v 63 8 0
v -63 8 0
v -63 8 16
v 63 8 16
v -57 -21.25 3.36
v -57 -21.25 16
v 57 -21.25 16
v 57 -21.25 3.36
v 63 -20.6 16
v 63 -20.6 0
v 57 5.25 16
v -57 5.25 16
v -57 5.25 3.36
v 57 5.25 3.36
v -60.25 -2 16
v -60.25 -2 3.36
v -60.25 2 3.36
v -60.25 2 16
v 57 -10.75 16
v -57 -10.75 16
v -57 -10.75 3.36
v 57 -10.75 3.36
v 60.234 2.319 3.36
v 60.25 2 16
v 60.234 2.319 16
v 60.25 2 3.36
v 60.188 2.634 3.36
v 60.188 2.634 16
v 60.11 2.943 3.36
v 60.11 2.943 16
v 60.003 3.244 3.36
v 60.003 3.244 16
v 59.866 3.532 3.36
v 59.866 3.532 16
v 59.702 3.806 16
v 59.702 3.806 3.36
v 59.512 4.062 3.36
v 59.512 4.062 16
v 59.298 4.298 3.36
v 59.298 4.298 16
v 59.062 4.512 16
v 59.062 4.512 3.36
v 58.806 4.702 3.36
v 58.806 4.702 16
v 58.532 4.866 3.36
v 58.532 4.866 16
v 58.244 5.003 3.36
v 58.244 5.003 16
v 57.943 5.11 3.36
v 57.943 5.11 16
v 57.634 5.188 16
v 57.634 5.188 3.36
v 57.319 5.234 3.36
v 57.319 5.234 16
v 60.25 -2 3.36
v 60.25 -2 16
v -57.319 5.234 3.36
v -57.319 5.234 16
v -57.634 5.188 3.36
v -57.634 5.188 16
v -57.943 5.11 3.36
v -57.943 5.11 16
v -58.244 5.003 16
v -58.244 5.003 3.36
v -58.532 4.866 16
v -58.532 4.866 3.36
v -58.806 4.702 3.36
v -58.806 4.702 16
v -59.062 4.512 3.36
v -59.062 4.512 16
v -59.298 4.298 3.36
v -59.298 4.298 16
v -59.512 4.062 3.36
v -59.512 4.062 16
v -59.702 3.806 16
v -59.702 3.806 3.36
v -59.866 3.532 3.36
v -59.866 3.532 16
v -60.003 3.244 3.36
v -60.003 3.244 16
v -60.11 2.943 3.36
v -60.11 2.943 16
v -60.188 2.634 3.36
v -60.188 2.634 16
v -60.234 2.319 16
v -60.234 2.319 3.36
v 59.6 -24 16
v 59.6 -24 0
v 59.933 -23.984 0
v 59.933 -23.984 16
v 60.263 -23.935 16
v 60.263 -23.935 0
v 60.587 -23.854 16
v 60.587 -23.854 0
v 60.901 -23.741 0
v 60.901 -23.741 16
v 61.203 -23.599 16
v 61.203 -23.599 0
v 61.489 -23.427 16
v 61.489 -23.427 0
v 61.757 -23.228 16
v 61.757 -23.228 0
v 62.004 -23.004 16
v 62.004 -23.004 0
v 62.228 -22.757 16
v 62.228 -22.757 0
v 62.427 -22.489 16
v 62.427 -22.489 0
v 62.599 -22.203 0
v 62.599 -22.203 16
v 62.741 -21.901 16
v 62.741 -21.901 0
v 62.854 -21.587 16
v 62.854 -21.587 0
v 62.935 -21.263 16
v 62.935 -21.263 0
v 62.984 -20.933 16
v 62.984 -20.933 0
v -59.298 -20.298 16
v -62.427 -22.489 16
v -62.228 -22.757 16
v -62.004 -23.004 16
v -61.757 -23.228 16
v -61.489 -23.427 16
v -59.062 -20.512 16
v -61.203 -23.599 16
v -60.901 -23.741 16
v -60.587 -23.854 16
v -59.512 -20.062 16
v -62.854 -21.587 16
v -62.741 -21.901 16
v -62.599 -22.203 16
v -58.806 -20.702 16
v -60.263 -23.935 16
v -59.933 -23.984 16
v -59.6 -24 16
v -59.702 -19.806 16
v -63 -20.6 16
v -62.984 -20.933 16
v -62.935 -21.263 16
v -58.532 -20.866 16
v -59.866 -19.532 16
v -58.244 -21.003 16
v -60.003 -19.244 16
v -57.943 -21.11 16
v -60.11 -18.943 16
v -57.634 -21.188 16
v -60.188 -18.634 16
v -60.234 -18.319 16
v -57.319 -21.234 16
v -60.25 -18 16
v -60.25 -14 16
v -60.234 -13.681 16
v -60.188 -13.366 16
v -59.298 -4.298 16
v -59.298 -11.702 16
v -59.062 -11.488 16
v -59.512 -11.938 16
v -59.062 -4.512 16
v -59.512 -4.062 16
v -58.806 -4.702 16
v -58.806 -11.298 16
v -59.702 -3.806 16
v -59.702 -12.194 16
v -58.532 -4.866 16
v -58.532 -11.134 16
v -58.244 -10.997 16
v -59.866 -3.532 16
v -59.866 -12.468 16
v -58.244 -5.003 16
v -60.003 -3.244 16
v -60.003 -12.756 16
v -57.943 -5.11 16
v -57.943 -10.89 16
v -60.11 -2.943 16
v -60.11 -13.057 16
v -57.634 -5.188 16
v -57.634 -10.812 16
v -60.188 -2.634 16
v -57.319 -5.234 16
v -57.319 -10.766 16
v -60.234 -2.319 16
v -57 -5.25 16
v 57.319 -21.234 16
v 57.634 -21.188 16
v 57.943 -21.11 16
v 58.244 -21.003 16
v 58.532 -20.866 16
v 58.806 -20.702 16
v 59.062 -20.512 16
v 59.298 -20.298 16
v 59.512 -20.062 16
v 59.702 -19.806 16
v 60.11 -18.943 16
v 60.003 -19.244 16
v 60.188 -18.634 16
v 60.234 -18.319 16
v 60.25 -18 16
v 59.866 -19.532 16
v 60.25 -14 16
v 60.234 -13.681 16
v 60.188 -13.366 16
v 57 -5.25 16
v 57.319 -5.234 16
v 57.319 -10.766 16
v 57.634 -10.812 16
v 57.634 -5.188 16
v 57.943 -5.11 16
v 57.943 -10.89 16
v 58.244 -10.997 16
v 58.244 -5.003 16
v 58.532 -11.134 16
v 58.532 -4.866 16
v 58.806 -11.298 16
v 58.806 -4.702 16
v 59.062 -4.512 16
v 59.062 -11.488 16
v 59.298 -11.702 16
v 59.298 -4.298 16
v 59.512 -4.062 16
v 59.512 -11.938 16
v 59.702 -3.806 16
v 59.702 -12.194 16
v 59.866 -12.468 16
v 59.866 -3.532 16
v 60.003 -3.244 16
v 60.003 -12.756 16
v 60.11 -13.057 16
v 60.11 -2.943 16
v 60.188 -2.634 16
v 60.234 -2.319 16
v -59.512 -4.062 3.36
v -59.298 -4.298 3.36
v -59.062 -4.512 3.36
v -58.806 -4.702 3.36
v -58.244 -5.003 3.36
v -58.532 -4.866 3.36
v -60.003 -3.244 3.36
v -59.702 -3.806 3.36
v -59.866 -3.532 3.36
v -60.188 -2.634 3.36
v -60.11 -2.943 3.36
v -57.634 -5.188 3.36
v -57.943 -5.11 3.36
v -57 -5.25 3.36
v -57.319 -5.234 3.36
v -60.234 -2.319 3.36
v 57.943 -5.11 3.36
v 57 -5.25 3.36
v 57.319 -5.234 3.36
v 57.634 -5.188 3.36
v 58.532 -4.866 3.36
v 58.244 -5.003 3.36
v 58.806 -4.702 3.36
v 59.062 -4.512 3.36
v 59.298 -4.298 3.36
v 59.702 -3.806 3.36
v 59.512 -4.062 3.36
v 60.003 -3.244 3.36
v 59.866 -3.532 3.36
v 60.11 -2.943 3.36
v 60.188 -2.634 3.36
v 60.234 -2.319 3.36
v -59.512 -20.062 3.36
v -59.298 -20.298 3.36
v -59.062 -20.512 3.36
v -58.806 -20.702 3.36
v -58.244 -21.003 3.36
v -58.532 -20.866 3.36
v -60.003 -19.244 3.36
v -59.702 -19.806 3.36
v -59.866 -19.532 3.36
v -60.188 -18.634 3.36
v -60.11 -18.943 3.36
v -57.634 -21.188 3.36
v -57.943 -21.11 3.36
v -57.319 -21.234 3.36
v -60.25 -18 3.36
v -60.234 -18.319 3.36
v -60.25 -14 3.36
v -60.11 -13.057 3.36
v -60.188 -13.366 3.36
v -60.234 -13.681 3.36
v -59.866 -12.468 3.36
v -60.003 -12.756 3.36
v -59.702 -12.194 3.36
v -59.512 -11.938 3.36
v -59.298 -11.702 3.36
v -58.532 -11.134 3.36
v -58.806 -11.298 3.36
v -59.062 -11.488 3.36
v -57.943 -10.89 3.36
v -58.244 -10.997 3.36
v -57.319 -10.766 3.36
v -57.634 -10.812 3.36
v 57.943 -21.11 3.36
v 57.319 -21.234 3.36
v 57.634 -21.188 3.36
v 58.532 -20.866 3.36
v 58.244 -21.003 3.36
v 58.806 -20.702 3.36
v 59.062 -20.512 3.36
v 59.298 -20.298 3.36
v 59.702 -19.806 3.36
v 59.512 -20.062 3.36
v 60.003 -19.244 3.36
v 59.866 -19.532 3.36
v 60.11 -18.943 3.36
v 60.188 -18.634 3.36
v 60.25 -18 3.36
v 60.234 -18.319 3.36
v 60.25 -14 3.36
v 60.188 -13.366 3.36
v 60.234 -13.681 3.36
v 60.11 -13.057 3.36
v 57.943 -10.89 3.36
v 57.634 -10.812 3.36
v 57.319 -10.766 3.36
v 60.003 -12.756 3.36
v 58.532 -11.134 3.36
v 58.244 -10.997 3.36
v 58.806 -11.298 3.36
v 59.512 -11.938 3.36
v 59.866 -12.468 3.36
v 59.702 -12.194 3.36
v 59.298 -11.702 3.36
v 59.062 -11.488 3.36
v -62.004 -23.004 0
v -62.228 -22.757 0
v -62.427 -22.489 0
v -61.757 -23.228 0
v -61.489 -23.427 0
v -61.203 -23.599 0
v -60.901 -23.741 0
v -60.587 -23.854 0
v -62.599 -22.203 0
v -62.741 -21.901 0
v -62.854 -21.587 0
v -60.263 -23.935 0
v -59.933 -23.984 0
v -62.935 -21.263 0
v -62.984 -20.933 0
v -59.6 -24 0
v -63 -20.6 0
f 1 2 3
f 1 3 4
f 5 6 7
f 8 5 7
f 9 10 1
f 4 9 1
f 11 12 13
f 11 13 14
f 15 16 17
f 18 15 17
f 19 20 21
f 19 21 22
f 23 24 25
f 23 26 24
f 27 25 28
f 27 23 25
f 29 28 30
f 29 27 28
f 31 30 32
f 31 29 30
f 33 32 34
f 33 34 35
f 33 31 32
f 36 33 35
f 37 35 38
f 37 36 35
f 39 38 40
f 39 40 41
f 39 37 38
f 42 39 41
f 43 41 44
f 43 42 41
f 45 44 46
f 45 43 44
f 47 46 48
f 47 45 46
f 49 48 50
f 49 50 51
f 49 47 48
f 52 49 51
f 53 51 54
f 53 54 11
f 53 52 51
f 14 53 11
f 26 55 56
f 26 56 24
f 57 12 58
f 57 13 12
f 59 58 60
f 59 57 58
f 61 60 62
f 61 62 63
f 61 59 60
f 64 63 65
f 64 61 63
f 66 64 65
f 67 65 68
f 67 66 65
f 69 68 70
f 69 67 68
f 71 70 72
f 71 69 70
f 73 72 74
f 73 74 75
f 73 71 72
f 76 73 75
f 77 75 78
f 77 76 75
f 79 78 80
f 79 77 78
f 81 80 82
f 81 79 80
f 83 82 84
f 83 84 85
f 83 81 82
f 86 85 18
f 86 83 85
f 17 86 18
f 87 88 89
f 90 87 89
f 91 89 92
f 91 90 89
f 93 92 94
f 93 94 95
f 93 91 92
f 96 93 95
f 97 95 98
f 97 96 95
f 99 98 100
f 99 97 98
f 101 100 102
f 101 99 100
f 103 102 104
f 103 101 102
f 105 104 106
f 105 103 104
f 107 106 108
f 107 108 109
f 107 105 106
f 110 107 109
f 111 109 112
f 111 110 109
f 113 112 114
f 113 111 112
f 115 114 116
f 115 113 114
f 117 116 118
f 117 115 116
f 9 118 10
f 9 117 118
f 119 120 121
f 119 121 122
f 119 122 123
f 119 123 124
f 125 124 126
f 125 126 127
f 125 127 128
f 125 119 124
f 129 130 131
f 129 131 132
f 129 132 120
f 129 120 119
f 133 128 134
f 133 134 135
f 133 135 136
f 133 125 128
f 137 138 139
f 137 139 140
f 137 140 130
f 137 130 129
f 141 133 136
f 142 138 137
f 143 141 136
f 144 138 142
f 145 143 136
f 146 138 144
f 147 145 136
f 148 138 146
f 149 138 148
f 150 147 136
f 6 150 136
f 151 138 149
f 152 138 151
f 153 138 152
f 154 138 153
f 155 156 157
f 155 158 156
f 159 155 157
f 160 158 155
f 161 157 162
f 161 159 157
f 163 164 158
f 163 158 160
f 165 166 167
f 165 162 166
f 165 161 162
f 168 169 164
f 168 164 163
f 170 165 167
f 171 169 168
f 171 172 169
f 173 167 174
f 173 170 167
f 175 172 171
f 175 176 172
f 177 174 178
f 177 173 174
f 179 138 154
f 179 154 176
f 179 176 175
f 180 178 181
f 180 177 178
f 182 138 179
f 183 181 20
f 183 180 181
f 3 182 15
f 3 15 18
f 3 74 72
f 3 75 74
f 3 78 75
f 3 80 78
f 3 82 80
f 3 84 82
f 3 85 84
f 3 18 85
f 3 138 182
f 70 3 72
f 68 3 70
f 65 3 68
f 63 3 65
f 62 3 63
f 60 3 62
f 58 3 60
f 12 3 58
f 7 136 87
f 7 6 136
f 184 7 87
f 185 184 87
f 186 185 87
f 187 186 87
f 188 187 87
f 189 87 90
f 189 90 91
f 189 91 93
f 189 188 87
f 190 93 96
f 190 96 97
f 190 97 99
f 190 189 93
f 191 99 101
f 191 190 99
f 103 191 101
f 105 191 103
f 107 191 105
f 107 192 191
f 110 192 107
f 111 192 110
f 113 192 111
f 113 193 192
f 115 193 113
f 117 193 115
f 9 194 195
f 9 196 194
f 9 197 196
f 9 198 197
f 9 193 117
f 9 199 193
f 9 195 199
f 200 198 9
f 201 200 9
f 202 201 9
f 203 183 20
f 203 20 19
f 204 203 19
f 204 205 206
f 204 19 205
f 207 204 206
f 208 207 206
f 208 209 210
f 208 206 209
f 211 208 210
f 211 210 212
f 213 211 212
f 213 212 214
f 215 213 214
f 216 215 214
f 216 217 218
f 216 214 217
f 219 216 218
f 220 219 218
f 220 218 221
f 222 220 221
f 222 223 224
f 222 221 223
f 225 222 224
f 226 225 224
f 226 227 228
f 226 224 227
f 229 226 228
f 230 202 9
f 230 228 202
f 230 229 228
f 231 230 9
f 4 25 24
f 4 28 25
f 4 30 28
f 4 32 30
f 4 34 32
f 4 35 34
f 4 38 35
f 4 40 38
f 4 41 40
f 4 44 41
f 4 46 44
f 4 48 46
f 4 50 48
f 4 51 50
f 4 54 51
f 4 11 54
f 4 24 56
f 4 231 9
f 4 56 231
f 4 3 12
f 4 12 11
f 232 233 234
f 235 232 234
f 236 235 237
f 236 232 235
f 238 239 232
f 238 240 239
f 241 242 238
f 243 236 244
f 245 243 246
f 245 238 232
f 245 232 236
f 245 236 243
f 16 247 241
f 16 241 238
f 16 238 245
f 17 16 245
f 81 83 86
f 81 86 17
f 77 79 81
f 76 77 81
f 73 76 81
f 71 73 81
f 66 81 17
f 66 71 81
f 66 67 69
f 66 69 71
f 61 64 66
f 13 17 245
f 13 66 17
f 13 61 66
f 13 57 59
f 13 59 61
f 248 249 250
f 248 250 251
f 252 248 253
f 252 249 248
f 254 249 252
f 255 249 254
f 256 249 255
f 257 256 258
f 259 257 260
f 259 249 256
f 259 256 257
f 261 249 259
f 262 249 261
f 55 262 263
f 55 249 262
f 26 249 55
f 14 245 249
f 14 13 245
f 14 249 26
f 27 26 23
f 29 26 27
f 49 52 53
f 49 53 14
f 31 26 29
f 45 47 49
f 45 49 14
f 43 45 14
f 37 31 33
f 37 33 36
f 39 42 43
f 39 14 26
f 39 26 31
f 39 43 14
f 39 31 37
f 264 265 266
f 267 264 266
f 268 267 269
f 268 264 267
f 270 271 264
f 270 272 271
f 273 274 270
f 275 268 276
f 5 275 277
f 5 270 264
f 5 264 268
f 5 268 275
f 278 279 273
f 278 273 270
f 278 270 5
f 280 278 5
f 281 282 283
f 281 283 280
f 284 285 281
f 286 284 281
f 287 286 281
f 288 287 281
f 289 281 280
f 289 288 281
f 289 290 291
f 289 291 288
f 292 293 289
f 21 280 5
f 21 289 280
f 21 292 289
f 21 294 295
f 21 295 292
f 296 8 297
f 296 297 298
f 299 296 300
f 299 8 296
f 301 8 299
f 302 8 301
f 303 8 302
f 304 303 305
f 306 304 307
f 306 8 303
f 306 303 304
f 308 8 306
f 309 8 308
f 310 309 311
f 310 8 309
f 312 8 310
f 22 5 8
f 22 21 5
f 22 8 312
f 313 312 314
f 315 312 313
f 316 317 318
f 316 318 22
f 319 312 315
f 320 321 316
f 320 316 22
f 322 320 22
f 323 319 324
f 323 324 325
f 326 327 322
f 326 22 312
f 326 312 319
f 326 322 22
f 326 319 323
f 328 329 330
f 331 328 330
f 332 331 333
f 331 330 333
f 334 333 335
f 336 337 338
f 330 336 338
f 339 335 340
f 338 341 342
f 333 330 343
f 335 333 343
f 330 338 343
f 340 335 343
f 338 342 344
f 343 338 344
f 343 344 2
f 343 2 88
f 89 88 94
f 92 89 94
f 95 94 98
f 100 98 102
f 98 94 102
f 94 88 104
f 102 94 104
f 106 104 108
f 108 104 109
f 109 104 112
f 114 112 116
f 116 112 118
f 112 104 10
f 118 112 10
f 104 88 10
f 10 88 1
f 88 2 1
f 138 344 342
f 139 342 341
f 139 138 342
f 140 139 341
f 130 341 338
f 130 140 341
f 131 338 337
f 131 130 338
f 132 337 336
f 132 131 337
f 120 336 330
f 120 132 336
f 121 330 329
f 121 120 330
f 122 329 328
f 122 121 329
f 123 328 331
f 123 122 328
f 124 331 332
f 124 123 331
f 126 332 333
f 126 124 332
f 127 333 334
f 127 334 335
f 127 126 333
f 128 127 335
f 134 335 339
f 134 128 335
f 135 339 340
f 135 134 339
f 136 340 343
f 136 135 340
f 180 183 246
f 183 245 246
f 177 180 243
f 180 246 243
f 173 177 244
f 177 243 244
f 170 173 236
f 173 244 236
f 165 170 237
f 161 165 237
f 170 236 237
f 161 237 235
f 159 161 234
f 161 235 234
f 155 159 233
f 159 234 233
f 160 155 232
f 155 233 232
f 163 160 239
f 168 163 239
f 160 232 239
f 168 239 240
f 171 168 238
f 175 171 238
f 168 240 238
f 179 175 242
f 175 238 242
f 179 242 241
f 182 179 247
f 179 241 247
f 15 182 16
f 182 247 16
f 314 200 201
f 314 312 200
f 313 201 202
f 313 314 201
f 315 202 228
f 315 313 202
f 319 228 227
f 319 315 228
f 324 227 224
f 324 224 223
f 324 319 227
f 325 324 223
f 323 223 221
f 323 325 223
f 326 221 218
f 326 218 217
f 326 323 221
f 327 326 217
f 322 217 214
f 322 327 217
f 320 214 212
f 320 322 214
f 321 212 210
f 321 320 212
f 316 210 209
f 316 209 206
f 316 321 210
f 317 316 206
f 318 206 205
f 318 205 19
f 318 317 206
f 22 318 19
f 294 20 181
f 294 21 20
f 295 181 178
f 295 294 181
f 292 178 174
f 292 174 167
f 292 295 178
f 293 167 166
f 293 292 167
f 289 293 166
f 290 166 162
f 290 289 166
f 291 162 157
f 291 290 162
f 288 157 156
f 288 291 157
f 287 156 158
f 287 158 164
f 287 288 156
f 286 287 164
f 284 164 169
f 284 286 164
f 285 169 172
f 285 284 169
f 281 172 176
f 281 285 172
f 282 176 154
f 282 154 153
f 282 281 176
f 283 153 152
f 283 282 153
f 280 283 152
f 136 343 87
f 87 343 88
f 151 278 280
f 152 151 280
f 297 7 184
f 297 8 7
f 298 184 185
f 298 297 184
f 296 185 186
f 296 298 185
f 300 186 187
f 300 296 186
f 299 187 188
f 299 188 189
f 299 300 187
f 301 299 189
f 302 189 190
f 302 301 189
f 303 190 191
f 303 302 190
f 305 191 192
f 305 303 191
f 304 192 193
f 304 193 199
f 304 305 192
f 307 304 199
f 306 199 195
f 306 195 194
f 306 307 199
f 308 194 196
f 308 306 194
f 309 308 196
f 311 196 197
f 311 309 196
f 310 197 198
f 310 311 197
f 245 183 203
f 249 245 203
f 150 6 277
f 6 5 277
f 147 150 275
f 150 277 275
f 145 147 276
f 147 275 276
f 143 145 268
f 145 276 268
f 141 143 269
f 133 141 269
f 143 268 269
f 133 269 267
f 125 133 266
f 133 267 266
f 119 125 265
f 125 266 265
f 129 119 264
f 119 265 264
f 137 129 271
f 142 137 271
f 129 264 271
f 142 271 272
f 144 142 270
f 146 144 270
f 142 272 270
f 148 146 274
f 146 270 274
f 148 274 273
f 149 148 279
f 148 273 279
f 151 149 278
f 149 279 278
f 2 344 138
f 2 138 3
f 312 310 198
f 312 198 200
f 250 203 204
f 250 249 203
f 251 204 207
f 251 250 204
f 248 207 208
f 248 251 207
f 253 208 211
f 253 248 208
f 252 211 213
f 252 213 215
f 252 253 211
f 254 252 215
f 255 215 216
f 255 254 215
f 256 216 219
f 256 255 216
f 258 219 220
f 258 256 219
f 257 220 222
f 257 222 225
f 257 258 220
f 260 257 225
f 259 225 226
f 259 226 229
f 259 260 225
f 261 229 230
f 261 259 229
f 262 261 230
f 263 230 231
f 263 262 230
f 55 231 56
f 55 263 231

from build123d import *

# Parameters (mm, degrees)
SKETCH002_W     = 126
SKETCH002_H     = 16
PAD001_DEPTH    = 16
SKETCH003_W     = 120.5
SKETCH003_H     = 10.5
POCKET001_DEPTH = 12.64
FILLET001_R     = 3.25
FILLET003_R     = 3.4


with BuildPart() as postolje:
    # Sketch002 → Pad001 (new body)
    with BuildSketch(Plane.XY):
        Rectangle(SKETCH002_W, SKETCH002_H)
    extrude(amount=PAD001_DEPTH)

    # Sketch003 (on DatumPlane) → Pocket001 (cut)
    with BuildSketch(Plane.XY.offset(16)):
        Rectangle(SKETCH003_W, SKETCH003_H)
    extrude(amount=-POCKET001_DEPTH, mode=Mode.SUBTRACT)

    # Fillet001
    fillet001_edges = [postolje.edges().sort_by_distance(p)[0] for p in [
        (-60.25, 5.25, 9.68),
        (-60.25, -5.25, 9.68),
        (60.25, -5.25, 9.68),
        (60.25, 5.25, 9.68),
    ]]
    fillet(fillet001_edges, radius=FILLET001_R)


with BuildPart() as fillet003:
    # Body001003 base: copy of Postolje
    add(postolje.part)


with BuildPart() as fillet003_1:
    # Body001003 placement: moved
    add(fillet003.part.moved(Location((0, -16, 0))))

    # Fillet003
    fillet003_edges = [fillet003_1.edges().sort_by_distance(p)[0] for p in [
        (-63, -24, 8),
        (63, -24, 8),
    ]]
    fillet(fillet003_edges, radius=FILLET003_R)


with BuildPart() as f_2_spojena_postolja:
    # Fusion base: copy of Postolje
    add(postolje.part)

    # Fusion: union Fillet003
    add(fillet003_1.part)


solid = f_2_spojena_postolja.part
